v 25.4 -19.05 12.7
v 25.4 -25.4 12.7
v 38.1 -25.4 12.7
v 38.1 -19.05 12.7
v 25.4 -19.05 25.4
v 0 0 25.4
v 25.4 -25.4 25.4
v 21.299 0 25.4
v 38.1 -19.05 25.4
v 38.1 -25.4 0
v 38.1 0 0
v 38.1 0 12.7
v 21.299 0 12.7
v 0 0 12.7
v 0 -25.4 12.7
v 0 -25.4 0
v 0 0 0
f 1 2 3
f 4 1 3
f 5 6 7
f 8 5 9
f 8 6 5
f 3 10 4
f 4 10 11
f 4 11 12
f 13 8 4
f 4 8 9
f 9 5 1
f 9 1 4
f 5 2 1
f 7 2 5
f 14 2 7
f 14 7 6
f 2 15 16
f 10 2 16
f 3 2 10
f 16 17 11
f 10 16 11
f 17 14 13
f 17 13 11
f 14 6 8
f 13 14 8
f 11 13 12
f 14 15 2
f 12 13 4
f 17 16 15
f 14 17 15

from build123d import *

# Parameters (mm, degrees)
F0_W     = 38.1
F0_H     = 25.4
F1_DEPTH = 25.4
F2_W     = 12.7
F2_H     = 12.7
F3_DEPTH = 6.35
F5_DEPTH = 12.7


with BuildPart() as f1:
    # F0 (on Front) → F1 (new body)
    with BuildSketch(Plane.XZ):
        with Locations((19.05, 12.7)):
            Rectangle(F0_W, F0_H)
    extrude(amount=F1_DEPTH)

    # F2 (on face) → F3 (cut)
    with BuildSketch(Plane.XZ.offset(25.4)):
        with Locations((31.75, 19.05)):
            Rectangle(F2_W, F2_H)
    extrude(amount=-F3_DEPTH, mode=Mode.SUBTRACT)

    # F4 (on face) → F5 (cut, symmetric)
    with BuildSketch(Plane.XY.offset(25.4)):
        Polygon((25.4, -25.4), (0, 0), (0, -25.4), align=None)
        Polygon((38.1, 0), (21.299479, 0), (38.1, -19.05), align=None)
    extrude(amount=F5_DEPTH, both=True, mode=Mode.SUBTRACT)


solid = f1.part
